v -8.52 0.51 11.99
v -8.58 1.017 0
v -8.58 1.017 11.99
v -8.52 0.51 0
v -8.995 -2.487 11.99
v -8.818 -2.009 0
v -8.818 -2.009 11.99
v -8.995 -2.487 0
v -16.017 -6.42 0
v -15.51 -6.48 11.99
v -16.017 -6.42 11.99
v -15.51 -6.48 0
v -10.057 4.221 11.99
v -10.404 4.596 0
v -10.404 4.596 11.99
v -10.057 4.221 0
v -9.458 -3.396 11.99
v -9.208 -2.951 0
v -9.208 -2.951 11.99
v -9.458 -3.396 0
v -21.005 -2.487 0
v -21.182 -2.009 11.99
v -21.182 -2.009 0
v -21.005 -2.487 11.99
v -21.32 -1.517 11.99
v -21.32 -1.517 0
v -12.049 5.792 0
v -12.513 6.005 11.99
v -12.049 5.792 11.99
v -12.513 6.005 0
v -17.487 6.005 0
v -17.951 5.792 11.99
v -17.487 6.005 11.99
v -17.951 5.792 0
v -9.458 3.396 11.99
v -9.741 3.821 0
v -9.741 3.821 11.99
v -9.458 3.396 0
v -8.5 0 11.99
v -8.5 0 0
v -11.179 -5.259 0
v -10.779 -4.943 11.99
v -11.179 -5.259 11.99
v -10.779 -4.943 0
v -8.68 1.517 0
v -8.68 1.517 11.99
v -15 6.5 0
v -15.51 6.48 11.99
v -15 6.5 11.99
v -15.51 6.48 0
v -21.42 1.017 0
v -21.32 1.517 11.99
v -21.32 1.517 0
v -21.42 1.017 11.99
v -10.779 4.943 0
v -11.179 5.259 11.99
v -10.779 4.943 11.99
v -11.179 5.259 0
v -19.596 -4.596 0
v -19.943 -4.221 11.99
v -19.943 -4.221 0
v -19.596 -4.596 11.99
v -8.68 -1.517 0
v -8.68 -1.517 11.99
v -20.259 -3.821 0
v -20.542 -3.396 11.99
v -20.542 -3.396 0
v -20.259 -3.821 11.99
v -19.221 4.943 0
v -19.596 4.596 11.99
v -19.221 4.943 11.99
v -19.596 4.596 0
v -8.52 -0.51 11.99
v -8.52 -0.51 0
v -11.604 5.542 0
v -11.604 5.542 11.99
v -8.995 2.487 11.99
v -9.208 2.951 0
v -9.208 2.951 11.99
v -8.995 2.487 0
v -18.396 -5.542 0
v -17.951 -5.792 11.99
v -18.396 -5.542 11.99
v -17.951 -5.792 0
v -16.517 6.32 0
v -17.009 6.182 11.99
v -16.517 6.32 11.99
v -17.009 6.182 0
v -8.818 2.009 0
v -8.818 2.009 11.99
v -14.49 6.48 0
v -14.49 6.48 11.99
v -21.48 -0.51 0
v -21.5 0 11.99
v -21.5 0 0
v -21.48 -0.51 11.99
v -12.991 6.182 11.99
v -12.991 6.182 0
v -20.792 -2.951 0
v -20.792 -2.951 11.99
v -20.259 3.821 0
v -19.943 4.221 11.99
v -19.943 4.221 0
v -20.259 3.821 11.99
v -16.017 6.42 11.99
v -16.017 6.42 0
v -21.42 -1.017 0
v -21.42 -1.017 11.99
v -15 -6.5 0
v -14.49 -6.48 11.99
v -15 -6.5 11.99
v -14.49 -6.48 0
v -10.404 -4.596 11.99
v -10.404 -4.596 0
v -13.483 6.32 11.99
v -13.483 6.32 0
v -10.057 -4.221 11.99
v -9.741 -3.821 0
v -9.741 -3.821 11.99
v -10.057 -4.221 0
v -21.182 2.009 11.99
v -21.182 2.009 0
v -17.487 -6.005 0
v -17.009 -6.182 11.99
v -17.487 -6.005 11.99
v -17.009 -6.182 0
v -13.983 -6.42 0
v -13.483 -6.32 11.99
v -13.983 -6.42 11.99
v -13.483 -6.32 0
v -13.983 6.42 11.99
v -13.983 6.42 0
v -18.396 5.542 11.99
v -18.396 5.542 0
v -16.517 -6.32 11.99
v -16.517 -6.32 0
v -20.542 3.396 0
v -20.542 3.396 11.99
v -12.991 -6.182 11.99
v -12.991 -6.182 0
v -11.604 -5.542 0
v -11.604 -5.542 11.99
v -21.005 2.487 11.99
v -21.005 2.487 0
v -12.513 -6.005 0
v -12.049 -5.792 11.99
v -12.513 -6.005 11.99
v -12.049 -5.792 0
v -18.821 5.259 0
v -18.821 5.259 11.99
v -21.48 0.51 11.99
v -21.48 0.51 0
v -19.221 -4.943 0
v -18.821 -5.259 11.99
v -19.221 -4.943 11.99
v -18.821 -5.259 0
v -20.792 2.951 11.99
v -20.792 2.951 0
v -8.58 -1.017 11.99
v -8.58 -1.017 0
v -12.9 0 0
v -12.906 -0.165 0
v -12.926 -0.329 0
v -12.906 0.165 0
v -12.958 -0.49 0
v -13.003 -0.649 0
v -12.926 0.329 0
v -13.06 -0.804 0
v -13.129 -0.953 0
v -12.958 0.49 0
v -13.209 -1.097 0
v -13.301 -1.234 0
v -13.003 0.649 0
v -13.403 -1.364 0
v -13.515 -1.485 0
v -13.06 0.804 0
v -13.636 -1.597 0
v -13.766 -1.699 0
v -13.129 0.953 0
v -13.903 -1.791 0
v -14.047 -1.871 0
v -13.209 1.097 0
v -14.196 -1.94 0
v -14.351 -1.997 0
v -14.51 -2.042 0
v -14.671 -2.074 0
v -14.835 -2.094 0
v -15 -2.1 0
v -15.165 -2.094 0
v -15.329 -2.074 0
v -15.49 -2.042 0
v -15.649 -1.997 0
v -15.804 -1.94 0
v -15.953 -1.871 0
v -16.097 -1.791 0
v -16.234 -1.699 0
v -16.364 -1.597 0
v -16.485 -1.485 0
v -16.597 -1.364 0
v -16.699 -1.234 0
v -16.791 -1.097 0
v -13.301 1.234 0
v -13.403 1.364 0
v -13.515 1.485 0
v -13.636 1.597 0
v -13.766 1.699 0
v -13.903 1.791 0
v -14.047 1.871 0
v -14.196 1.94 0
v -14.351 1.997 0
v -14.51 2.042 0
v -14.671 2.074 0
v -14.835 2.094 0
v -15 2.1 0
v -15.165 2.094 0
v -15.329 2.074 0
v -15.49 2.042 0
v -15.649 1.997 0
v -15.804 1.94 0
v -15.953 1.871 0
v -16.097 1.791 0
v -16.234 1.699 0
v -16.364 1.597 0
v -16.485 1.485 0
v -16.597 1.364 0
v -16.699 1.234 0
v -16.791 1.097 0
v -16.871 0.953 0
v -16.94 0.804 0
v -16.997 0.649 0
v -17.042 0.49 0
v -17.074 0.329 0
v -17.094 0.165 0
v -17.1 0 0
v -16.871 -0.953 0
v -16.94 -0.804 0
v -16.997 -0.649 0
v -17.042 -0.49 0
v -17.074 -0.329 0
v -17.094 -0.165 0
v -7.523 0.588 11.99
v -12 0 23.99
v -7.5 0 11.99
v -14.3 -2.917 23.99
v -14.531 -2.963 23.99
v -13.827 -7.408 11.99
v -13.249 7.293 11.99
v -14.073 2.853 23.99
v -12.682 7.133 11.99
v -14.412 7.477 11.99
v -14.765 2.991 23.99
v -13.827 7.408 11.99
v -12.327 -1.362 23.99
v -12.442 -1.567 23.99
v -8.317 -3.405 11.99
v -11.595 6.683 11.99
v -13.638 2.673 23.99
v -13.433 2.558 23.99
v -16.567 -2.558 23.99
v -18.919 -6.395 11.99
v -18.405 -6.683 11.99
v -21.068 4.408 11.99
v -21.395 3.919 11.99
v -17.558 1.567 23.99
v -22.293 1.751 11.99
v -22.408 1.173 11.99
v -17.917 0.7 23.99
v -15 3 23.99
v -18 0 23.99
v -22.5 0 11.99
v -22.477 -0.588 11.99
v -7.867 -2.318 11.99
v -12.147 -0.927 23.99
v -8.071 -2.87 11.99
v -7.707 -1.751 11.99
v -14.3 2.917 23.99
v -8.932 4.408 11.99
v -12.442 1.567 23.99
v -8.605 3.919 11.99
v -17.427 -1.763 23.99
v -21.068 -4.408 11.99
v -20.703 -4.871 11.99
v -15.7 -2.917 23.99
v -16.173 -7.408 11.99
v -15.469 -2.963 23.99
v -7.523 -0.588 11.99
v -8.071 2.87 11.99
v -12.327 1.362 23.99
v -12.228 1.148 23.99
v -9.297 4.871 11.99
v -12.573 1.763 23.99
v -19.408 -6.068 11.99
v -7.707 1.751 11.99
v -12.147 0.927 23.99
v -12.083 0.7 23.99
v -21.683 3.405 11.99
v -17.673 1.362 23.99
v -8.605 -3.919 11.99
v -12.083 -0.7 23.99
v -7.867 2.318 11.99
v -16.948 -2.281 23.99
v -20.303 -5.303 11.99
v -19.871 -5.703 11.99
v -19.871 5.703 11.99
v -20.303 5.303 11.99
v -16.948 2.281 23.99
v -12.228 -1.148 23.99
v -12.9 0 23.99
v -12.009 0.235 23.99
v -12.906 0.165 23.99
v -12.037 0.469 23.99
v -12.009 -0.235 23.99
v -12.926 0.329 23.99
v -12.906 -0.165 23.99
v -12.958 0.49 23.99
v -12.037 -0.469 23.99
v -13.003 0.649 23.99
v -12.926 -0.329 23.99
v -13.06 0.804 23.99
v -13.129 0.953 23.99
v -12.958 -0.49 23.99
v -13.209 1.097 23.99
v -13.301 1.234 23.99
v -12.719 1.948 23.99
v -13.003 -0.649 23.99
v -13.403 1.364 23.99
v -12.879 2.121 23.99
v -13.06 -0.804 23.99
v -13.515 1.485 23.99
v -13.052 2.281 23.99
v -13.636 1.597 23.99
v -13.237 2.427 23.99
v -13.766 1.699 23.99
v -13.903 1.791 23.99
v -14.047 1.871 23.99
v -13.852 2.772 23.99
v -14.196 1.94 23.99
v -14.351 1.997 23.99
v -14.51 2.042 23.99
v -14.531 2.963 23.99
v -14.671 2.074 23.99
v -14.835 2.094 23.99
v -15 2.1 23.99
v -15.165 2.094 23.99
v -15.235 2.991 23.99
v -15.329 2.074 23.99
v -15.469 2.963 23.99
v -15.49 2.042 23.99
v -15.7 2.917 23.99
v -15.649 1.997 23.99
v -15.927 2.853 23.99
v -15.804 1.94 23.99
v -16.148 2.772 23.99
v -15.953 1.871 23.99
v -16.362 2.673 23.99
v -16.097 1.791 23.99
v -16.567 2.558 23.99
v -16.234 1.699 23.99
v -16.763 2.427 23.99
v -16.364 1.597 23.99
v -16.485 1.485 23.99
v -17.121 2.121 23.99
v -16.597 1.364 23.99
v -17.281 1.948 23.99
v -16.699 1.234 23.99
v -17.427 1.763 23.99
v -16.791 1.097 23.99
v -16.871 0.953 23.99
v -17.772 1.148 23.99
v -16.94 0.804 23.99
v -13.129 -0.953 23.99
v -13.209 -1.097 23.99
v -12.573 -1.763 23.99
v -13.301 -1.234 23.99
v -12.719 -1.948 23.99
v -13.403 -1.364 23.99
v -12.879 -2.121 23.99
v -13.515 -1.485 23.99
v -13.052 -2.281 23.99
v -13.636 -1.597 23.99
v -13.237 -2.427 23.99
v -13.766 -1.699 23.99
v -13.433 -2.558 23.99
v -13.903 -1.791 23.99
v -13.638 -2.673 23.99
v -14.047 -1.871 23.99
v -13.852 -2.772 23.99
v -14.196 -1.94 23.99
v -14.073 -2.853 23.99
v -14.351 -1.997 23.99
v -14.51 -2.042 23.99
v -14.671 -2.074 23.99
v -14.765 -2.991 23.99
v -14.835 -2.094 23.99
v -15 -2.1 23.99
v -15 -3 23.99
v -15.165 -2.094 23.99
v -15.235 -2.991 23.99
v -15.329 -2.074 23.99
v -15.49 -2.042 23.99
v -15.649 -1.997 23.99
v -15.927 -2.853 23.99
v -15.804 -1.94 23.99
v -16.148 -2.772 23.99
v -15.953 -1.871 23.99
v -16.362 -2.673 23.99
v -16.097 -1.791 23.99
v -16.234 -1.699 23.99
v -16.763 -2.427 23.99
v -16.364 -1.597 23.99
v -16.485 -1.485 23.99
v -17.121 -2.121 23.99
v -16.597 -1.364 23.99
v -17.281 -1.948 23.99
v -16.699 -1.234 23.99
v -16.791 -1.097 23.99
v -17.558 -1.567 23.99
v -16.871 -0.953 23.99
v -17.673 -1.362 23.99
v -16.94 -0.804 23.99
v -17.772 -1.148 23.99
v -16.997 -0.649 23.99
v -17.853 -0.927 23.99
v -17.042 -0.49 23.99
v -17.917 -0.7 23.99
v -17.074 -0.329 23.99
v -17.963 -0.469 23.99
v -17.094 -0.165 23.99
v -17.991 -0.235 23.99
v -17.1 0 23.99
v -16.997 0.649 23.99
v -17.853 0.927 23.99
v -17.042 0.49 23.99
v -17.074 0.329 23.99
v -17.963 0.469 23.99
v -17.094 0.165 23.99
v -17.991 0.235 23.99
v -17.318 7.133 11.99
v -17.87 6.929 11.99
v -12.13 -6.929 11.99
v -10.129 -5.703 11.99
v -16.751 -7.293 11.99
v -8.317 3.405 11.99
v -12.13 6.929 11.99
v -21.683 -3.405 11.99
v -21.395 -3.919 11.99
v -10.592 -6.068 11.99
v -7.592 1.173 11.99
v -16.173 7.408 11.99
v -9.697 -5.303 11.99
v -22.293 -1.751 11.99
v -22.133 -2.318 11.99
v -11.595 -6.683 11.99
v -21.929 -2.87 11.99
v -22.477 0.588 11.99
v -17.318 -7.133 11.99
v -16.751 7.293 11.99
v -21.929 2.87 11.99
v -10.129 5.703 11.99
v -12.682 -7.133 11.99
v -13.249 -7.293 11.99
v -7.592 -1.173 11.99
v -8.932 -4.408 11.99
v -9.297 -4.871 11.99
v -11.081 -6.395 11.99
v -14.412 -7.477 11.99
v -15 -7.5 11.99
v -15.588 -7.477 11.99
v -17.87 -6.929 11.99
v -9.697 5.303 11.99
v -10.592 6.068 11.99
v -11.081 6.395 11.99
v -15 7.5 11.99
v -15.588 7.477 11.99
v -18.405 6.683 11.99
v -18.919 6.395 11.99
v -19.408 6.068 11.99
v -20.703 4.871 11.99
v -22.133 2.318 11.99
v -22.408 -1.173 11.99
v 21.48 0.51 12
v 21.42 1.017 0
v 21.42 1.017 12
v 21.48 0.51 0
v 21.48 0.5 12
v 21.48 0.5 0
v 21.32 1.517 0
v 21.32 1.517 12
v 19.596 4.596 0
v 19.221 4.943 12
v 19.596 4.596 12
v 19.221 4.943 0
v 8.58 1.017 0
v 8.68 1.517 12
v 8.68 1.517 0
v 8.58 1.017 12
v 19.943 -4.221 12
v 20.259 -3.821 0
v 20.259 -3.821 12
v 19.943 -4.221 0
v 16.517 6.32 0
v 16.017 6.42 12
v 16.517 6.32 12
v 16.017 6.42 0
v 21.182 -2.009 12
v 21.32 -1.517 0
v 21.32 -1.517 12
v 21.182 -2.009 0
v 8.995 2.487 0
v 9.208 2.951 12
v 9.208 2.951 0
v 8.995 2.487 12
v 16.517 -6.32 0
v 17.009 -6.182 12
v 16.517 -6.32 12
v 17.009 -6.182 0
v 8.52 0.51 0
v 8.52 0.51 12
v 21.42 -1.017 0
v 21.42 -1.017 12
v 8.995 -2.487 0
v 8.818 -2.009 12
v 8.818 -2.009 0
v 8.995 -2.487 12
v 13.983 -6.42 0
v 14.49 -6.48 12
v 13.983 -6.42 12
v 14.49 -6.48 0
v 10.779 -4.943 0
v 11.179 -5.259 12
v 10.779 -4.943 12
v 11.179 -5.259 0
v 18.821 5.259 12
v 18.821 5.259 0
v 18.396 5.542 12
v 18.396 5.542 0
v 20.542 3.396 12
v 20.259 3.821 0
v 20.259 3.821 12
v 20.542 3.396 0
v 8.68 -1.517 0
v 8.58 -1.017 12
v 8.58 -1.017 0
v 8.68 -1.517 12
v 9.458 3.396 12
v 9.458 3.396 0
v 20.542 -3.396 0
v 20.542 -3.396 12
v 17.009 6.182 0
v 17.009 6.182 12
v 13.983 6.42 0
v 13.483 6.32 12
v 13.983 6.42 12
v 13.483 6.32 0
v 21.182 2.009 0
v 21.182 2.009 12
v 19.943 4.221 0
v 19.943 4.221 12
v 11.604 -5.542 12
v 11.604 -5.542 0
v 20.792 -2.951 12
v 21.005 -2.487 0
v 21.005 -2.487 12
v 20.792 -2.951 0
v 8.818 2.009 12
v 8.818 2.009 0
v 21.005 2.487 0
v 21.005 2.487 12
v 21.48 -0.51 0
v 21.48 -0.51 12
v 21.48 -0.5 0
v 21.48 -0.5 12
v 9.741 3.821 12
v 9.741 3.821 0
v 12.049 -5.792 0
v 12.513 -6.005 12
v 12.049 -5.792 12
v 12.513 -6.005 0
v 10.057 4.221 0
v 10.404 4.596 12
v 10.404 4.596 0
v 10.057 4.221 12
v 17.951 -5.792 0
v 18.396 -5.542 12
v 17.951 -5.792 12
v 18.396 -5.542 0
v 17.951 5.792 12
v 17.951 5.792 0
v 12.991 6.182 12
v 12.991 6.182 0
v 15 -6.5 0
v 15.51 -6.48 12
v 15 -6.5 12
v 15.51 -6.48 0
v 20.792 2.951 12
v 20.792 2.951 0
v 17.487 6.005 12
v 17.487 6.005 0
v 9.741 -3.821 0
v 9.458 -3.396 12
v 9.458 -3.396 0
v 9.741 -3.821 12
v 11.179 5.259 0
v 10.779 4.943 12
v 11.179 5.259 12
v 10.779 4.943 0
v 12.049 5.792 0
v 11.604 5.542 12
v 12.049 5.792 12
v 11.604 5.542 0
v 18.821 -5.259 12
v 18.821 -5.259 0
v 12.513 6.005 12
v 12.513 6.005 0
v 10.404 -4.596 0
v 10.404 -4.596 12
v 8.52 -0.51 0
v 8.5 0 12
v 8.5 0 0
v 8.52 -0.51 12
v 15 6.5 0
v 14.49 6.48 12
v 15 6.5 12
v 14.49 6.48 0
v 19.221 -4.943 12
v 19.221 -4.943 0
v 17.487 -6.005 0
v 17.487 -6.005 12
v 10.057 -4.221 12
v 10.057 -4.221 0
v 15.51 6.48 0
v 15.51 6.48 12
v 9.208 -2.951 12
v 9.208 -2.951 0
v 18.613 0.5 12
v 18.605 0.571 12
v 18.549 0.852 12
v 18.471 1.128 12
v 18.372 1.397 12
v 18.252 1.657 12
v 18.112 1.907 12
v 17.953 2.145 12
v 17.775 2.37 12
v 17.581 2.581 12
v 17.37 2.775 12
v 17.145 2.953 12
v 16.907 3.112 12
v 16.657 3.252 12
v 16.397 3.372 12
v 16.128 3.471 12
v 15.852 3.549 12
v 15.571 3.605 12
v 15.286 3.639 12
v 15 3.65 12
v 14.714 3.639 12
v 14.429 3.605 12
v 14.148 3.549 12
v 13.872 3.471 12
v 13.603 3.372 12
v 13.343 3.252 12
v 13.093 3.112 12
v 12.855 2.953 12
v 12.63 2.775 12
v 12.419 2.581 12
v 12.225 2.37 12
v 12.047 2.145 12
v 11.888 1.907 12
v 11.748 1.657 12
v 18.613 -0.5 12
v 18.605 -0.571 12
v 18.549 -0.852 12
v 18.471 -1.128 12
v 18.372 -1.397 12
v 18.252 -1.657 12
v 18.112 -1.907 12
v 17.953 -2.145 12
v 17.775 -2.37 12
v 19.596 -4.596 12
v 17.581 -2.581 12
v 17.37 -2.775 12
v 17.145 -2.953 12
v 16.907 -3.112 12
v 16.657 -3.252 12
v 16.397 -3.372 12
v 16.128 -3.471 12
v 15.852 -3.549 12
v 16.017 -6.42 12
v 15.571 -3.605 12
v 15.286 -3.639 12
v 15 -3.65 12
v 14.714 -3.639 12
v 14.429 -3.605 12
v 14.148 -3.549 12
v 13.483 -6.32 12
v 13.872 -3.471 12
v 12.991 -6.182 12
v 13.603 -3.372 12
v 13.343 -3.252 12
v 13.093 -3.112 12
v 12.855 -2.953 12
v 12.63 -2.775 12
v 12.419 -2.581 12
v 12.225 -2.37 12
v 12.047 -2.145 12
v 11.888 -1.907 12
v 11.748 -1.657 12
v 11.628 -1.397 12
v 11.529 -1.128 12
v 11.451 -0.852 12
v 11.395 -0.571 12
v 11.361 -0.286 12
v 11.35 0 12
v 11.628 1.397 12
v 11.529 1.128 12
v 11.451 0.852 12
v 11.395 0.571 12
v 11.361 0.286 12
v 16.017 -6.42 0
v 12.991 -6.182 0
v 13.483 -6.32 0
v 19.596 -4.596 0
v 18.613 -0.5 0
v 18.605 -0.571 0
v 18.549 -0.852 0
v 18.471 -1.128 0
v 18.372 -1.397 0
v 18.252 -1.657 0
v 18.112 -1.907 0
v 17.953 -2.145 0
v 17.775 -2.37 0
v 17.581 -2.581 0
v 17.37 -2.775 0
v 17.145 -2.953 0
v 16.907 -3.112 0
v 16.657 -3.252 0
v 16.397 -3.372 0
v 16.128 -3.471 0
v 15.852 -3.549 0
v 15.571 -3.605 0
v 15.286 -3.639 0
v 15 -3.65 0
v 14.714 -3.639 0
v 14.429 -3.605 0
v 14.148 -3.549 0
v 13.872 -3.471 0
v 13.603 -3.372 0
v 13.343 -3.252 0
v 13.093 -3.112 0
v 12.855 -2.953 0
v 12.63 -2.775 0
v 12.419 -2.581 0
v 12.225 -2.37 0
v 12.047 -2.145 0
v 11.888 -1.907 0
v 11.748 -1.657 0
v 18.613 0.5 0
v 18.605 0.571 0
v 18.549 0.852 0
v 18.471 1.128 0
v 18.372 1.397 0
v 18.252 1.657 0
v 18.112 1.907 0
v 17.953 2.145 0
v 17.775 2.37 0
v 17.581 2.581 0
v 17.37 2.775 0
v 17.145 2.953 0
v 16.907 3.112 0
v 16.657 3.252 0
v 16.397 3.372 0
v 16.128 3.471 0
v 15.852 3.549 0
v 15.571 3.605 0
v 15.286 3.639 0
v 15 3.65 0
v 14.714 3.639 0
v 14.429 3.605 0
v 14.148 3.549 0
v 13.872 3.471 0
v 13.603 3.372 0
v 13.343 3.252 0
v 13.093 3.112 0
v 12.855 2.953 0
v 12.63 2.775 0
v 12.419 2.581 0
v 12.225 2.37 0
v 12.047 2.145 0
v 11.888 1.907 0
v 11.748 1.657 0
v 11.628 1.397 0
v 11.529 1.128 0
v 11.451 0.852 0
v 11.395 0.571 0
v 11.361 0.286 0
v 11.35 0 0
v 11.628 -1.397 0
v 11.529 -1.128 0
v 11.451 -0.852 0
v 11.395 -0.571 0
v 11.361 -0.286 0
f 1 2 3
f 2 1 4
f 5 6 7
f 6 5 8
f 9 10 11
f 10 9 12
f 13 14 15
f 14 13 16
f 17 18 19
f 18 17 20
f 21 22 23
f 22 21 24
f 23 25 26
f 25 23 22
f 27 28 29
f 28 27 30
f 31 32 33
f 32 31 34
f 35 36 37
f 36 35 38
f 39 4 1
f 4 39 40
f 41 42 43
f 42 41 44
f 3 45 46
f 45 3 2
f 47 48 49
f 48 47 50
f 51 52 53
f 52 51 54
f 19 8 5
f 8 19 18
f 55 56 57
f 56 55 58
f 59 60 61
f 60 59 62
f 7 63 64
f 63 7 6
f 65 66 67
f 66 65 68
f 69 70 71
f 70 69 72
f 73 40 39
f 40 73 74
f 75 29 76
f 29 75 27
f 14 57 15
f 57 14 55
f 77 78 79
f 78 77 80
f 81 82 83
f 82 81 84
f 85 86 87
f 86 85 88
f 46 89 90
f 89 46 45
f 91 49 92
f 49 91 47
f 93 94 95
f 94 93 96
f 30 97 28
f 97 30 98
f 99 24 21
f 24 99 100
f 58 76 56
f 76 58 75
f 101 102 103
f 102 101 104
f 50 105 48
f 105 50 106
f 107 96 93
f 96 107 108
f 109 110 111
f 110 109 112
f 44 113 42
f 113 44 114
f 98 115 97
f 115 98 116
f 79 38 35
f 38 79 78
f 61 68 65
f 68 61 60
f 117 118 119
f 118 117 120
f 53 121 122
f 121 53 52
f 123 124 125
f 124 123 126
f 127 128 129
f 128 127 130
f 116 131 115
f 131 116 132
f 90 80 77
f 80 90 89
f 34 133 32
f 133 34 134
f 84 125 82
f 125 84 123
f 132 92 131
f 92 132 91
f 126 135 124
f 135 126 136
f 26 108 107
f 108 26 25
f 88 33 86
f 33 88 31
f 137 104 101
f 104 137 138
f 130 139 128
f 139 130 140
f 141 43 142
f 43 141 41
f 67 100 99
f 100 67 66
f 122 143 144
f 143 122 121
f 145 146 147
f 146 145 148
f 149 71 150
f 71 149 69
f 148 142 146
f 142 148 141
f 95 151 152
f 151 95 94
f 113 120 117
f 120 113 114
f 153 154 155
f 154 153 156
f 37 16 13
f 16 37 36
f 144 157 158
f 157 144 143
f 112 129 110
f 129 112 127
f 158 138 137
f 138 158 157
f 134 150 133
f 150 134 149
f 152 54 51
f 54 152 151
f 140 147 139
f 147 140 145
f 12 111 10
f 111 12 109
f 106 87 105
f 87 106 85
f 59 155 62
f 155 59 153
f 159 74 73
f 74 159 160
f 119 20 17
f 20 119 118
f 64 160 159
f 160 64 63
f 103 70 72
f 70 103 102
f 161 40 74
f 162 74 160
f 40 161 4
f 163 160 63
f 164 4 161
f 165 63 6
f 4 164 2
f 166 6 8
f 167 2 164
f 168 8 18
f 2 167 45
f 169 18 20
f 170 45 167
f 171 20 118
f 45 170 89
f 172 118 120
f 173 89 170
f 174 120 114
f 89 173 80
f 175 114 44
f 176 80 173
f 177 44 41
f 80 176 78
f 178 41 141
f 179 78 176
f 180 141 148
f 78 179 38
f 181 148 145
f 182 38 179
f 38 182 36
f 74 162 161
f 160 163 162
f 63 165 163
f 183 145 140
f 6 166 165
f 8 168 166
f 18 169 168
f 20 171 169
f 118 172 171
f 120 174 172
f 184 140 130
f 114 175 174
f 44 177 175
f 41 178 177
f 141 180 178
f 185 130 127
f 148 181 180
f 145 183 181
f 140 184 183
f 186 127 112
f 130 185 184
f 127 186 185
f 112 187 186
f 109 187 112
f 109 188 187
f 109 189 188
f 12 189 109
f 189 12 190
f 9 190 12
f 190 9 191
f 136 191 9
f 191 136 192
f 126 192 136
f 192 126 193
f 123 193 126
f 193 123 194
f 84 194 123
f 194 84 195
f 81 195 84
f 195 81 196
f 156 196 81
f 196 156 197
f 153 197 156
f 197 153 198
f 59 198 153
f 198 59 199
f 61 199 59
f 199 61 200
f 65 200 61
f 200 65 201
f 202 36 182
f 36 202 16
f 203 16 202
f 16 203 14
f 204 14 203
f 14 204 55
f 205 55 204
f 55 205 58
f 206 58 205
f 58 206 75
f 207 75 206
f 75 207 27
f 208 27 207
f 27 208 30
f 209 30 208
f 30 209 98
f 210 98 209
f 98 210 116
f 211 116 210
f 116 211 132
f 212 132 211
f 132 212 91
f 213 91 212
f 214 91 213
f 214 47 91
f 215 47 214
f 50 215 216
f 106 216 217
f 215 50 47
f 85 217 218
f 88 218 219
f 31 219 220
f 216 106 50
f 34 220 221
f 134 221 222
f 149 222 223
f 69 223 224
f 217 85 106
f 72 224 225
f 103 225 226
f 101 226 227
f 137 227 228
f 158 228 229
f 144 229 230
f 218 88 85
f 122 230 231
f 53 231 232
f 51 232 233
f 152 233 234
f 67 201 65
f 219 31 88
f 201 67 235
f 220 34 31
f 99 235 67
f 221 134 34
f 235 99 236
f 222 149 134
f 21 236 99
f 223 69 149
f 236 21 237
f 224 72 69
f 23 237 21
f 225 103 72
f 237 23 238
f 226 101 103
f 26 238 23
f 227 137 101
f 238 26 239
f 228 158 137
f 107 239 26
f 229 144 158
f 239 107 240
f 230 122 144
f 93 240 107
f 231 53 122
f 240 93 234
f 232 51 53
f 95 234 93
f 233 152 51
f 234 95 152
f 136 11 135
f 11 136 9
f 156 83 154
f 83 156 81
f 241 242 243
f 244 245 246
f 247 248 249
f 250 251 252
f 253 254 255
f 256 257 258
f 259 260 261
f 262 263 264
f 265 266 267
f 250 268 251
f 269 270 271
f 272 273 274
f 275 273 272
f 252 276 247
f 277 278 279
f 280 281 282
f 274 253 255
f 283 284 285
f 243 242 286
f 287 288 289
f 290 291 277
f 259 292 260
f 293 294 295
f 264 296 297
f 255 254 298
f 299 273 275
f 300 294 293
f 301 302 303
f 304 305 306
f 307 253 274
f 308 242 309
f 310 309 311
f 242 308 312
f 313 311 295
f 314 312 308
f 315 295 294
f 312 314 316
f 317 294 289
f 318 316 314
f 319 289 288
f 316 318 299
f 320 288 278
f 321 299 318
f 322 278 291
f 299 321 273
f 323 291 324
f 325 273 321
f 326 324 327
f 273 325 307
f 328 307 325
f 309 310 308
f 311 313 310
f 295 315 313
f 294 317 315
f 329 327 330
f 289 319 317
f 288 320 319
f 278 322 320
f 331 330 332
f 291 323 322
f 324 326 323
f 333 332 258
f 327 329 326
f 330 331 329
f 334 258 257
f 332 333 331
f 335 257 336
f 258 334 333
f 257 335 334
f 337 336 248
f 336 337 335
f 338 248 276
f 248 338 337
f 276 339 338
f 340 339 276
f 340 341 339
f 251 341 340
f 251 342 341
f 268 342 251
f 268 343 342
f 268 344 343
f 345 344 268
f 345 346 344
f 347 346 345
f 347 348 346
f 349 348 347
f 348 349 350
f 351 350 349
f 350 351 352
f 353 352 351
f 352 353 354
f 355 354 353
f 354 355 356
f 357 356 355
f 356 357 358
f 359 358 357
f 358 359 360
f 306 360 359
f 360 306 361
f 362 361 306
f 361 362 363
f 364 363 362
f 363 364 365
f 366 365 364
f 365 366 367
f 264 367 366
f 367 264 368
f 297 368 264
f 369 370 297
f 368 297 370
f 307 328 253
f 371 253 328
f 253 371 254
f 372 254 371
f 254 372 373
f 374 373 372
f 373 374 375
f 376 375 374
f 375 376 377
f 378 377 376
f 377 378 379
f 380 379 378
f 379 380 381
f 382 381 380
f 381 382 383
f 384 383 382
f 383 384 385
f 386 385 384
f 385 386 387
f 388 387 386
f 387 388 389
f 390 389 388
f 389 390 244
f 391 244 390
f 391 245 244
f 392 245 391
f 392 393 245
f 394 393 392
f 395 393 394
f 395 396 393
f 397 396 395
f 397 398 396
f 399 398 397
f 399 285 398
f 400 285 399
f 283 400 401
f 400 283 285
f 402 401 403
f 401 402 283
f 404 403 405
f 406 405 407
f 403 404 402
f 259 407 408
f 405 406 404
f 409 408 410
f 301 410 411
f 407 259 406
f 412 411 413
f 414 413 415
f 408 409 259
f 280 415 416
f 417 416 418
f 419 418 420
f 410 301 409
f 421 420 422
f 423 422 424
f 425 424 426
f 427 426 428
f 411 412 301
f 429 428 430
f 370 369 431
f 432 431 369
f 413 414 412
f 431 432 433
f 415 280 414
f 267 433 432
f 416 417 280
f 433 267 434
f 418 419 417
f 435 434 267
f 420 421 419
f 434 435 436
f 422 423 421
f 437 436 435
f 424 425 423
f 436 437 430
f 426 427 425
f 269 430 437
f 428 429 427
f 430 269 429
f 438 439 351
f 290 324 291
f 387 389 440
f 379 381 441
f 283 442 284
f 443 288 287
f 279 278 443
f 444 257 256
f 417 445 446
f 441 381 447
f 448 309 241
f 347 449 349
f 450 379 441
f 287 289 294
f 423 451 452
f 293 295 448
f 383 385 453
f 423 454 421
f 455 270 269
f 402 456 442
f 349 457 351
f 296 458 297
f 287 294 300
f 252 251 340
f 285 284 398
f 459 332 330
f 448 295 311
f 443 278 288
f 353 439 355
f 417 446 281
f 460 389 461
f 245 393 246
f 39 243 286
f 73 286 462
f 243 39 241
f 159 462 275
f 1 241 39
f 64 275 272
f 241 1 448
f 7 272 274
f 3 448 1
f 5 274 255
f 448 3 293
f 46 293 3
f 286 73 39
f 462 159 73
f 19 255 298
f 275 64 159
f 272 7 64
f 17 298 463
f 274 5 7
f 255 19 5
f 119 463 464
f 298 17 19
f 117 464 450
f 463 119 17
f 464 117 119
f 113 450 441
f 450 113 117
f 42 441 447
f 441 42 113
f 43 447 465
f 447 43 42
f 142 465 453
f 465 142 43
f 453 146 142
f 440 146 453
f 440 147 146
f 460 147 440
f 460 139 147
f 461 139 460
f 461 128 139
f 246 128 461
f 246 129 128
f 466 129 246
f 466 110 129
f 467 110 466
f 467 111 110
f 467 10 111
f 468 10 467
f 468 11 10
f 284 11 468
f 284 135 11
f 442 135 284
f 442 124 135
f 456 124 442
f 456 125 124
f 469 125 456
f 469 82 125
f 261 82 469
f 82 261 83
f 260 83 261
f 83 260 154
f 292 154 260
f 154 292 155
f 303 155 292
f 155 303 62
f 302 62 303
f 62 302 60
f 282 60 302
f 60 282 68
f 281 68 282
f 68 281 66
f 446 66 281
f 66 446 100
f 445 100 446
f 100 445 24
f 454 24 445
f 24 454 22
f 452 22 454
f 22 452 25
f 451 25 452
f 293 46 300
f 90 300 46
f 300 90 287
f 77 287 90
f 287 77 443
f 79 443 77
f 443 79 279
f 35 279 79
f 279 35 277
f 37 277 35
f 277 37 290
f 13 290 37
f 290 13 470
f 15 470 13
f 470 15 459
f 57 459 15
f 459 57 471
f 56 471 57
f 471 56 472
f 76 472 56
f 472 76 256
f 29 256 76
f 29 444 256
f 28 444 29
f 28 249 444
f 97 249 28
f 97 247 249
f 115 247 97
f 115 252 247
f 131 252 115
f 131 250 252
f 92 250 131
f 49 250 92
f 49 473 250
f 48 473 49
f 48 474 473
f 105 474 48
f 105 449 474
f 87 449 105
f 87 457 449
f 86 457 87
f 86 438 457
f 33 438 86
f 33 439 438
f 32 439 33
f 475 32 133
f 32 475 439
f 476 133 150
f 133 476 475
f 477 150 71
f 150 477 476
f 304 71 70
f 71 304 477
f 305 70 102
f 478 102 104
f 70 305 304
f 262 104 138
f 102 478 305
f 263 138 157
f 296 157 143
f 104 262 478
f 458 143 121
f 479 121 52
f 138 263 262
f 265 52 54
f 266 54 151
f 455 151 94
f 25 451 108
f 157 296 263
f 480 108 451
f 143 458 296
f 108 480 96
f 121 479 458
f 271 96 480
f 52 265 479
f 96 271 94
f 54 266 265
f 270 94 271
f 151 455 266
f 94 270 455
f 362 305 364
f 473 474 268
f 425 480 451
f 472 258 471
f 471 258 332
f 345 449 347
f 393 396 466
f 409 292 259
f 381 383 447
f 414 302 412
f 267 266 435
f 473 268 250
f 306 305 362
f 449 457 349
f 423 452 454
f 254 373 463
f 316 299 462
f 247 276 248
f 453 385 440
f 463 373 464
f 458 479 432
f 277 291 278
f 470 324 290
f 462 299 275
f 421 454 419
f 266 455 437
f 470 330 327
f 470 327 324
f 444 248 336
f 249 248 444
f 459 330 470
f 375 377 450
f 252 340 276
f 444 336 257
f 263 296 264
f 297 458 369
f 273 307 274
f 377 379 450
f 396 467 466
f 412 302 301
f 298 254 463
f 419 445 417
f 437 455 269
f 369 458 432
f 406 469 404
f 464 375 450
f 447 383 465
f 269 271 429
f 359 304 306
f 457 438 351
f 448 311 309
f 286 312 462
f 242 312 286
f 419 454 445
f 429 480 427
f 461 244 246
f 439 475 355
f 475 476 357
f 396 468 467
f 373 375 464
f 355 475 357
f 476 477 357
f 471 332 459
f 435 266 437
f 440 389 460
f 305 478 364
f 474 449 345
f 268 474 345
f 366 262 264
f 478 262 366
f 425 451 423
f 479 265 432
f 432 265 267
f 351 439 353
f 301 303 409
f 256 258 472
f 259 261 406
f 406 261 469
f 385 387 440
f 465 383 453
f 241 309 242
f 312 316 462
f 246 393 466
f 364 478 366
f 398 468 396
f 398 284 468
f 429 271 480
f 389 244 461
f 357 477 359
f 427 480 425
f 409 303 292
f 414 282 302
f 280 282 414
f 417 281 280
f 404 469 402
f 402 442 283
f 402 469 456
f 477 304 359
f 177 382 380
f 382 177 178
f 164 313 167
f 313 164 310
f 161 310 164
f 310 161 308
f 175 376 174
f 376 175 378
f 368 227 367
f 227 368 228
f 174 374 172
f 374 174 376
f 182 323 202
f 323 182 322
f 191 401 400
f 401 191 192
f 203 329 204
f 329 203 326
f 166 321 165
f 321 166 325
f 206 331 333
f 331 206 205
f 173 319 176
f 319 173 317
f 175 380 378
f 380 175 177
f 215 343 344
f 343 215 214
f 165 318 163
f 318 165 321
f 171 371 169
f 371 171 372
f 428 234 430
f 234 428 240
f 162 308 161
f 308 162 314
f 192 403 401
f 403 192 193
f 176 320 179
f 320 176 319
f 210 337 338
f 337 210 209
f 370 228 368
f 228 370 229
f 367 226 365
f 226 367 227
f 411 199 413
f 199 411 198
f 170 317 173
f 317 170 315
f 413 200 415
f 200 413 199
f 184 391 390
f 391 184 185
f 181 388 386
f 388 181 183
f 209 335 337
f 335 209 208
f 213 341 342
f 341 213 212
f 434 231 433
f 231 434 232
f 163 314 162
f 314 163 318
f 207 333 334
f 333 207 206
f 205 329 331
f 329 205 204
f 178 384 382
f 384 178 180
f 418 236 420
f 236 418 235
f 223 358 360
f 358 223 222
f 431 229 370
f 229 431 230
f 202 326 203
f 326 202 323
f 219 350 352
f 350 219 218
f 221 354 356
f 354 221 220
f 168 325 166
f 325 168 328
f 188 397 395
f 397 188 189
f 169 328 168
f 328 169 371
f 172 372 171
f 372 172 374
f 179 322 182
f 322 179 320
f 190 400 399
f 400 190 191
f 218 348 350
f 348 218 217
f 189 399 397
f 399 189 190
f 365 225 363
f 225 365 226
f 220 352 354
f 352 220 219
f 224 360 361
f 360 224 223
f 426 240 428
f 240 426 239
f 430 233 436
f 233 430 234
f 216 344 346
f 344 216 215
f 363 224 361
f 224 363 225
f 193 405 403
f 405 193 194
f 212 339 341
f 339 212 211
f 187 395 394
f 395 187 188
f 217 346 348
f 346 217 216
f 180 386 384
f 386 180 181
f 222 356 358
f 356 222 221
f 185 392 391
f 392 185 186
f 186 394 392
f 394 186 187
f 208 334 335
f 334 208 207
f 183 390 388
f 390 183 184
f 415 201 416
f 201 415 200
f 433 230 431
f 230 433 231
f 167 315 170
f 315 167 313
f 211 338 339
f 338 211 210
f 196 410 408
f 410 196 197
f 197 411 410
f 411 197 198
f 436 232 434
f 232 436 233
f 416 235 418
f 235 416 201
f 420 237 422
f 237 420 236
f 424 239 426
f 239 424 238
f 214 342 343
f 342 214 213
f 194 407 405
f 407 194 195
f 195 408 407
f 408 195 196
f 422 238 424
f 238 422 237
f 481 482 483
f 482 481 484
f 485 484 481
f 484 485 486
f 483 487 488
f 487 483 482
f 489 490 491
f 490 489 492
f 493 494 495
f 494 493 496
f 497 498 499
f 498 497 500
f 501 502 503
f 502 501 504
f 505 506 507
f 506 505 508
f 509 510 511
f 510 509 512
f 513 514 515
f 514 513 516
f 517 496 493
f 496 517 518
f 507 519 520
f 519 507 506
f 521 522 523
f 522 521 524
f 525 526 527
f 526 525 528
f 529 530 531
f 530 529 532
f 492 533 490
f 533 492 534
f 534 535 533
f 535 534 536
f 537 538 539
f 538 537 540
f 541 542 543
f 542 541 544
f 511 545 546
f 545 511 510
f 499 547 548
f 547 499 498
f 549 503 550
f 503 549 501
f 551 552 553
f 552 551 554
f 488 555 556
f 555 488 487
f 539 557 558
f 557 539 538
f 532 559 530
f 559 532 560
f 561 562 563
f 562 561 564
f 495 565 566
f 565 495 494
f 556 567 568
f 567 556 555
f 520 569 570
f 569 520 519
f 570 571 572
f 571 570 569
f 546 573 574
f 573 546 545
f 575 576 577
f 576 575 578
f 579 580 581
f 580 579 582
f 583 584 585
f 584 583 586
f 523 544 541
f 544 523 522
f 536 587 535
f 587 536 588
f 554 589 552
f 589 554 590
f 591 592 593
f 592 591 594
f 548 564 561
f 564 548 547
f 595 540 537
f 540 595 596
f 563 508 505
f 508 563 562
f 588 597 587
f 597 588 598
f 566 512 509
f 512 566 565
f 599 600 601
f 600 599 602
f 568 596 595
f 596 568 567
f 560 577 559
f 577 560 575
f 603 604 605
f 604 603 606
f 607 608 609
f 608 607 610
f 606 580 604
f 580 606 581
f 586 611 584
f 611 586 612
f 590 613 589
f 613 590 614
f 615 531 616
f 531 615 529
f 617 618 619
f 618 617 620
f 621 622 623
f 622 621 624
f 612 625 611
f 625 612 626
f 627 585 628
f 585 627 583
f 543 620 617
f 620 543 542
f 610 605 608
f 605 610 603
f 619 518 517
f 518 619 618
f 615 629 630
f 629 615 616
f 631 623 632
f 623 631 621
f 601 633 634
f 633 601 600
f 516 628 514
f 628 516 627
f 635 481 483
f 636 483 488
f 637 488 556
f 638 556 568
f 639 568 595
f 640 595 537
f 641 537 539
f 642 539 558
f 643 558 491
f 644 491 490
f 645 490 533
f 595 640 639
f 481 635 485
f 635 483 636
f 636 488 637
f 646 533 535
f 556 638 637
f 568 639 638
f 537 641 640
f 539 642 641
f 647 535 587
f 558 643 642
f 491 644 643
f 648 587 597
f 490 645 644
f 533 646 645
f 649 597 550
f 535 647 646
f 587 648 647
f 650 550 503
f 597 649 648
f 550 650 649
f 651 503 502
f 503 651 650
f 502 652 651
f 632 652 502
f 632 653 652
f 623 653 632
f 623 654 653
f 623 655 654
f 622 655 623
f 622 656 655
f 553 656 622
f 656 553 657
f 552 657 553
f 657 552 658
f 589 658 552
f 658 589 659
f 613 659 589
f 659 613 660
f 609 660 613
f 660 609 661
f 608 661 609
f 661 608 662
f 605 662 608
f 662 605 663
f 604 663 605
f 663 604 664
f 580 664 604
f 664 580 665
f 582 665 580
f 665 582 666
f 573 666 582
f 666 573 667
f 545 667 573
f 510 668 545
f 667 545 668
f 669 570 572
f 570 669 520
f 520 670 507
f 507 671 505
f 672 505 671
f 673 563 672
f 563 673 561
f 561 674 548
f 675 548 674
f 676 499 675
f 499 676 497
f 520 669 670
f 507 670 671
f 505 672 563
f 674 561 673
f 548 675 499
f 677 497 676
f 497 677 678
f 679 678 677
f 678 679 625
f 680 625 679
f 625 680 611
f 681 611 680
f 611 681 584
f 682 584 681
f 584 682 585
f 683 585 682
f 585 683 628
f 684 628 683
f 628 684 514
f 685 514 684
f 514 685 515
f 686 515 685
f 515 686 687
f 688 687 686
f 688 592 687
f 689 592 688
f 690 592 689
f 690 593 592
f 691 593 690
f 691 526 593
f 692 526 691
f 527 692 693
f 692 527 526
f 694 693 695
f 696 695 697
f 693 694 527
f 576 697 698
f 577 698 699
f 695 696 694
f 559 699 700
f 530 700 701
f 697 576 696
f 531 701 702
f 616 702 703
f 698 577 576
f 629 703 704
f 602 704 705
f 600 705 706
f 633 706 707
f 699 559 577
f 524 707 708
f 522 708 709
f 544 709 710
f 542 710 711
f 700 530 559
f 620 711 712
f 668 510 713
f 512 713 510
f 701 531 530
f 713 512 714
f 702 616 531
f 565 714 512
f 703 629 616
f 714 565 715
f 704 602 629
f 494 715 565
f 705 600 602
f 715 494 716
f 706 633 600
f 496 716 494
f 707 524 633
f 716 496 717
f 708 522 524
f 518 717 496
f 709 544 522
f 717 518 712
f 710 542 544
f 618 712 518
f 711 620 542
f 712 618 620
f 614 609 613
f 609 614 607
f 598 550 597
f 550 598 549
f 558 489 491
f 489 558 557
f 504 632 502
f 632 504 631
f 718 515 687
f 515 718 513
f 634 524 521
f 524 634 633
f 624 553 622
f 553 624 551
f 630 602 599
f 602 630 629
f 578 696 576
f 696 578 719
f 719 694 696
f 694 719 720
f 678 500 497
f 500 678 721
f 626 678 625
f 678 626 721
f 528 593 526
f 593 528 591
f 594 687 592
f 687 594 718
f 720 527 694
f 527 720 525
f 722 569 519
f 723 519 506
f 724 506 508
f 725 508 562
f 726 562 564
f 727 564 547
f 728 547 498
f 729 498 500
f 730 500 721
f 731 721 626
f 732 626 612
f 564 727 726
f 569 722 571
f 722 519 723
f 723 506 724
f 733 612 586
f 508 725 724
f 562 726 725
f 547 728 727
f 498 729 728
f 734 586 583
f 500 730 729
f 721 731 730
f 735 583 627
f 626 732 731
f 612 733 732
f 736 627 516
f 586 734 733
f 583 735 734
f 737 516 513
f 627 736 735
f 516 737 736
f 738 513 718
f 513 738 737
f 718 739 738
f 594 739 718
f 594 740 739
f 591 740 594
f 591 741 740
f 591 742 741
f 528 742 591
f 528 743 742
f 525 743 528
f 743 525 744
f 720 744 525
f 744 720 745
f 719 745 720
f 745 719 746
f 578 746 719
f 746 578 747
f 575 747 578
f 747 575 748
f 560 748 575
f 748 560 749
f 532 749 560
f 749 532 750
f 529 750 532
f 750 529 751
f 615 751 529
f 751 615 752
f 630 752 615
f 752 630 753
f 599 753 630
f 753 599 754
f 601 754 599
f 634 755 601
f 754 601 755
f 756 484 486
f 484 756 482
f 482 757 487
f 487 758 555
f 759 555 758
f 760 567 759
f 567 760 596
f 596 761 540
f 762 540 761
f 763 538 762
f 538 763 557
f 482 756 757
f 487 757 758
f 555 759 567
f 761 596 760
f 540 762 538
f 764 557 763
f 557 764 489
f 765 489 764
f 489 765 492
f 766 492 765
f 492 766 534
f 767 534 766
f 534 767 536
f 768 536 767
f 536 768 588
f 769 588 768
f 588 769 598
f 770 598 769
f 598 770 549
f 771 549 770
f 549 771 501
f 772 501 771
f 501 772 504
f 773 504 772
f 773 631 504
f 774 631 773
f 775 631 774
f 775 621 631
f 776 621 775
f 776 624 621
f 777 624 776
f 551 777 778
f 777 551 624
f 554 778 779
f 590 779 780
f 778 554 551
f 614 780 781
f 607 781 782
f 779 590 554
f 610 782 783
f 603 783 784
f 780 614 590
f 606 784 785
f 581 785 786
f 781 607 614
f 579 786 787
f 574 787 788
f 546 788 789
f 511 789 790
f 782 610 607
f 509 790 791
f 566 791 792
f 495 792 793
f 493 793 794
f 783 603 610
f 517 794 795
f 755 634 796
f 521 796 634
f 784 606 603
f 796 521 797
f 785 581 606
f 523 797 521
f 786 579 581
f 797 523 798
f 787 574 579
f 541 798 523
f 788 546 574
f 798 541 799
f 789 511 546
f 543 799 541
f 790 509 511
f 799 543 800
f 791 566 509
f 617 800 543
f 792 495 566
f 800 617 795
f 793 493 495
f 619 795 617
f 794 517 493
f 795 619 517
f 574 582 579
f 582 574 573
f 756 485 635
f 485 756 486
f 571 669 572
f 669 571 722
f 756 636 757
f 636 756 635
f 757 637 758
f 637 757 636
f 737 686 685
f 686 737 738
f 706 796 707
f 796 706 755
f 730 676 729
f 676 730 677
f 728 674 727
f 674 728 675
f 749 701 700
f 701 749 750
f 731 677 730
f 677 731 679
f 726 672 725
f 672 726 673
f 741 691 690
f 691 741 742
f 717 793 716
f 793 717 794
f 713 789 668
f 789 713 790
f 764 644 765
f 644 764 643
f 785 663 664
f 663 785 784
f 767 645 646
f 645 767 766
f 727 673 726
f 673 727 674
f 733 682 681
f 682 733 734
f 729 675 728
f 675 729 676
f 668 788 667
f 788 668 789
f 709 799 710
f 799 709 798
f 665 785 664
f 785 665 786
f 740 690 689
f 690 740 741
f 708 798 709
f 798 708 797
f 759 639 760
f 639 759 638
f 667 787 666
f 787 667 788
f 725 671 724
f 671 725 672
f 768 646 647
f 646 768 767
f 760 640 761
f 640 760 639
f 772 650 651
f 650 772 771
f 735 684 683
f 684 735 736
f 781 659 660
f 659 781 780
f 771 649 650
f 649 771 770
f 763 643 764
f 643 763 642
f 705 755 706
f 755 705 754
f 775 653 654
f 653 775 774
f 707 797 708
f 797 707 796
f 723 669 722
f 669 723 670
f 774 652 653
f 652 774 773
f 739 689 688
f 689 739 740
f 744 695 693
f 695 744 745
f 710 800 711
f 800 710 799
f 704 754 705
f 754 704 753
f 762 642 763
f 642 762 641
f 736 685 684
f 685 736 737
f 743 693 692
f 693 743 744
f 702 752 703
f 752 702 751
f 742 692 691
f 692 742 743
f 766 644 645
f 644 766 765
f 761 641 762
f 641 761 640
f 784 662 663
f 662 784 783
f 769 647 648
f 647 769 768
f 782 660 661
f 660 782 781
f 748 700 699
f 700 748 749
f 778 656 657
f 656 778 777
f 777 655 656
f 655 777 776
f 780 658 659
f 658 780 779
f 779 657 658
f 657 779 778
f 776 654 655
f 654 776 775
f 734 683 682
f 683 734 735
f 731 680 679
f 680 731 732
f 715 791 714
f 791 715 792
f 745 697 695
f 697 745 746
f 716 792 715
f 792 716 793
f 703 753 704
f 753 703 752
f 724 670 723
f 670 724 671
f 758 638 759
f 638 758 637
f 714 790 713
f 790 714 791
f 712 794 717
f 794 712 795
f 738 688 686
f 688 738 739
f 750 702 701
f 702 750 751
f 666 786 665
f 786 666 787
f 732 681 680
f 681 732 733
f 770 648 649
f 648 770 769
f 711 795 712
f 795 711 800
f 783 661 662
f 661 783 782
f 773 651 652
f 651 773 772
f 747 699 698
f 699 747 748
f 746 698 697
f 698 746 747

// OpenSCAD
/*
Probe tip spacers, for use with copper heating pipes
to make custom (and shielded) probe tips for old lab
equipment;

Copyrithgt By Atkelar, 2023, commercial rights reserved.
*/

// Show the "end cap" side element
ShowCap = true;

// Show the "sprint retainer" side element
ShowRetain = true;

// Tube inner diameter
InnerDiameter = 13.0;   // 0.01
// Tube outer diameter
OuterDiameter = 15.0;   // 0.01

// Diameter of the spring for the end cap
SpringDiameter = 7.3;   // 0.01

// The height of the retainer ring
RetainerHeight = 12;   // 0.01

// The slit in the retainer ring.abs
RetainerSlit = 1;   // 0.01

// The exposed height of the probe tip
TipHeight = 12;   // 0.01

// The diameter of the hole for the probe tip (usually inner diameter for a thread)
TipHole = 4.2;   // 0.01

// Outer diameter of the probe tip
TipDiameter = 6;   // 0.01

// the "sunken" part of the tip for mounting surface.
TipSleeveHeight = 12;   // 0.01


module ProbeCap()
{
    difference()
    {
        union()
        {
            cylinder(h = TipSleeveHeight, d = InnerDiameter);
            translate([0,0,TipSleeveHeight-$t])
                cylinder(d1 = OuterDiameter, d2 = TipDiameter, h = TipHeight);
        }
        translate([0,0,-$t])
            cylinder(h = TipSleeveHeight + TipHeight + 2*$t, d = TipHole);
    }
}

module ProbeRetainer()
{
    difference()
    {
        cylinder(h = RetainerHeight, d = InnerDiameter);
        translate([$t,-RetainerSlit / 2, -$t])
            cube([InnerDiameter / 2,RetainerSlit,RetainerHeight + 2*$t]);
        translate([0,0,-$t])
            cylinder(d = SpringDiameter, h = RetainerHeight + 2*$t);
    }
}

$t = 0.01;  // overlap for shapes to avoid visual artifacts.
$fn = 80;   // quality (# of faces on curved objects)

// distance between elements
$dist = (ShowCap && ShowRetain) ? OuterDiameter : 0;

if (ShowCap)
    translate([-$dist, 0, 0])
        ProbeCap();

if (ShowRetain)
{
    translate([$dist, 0,0])
        ProbeRetainer();
}
